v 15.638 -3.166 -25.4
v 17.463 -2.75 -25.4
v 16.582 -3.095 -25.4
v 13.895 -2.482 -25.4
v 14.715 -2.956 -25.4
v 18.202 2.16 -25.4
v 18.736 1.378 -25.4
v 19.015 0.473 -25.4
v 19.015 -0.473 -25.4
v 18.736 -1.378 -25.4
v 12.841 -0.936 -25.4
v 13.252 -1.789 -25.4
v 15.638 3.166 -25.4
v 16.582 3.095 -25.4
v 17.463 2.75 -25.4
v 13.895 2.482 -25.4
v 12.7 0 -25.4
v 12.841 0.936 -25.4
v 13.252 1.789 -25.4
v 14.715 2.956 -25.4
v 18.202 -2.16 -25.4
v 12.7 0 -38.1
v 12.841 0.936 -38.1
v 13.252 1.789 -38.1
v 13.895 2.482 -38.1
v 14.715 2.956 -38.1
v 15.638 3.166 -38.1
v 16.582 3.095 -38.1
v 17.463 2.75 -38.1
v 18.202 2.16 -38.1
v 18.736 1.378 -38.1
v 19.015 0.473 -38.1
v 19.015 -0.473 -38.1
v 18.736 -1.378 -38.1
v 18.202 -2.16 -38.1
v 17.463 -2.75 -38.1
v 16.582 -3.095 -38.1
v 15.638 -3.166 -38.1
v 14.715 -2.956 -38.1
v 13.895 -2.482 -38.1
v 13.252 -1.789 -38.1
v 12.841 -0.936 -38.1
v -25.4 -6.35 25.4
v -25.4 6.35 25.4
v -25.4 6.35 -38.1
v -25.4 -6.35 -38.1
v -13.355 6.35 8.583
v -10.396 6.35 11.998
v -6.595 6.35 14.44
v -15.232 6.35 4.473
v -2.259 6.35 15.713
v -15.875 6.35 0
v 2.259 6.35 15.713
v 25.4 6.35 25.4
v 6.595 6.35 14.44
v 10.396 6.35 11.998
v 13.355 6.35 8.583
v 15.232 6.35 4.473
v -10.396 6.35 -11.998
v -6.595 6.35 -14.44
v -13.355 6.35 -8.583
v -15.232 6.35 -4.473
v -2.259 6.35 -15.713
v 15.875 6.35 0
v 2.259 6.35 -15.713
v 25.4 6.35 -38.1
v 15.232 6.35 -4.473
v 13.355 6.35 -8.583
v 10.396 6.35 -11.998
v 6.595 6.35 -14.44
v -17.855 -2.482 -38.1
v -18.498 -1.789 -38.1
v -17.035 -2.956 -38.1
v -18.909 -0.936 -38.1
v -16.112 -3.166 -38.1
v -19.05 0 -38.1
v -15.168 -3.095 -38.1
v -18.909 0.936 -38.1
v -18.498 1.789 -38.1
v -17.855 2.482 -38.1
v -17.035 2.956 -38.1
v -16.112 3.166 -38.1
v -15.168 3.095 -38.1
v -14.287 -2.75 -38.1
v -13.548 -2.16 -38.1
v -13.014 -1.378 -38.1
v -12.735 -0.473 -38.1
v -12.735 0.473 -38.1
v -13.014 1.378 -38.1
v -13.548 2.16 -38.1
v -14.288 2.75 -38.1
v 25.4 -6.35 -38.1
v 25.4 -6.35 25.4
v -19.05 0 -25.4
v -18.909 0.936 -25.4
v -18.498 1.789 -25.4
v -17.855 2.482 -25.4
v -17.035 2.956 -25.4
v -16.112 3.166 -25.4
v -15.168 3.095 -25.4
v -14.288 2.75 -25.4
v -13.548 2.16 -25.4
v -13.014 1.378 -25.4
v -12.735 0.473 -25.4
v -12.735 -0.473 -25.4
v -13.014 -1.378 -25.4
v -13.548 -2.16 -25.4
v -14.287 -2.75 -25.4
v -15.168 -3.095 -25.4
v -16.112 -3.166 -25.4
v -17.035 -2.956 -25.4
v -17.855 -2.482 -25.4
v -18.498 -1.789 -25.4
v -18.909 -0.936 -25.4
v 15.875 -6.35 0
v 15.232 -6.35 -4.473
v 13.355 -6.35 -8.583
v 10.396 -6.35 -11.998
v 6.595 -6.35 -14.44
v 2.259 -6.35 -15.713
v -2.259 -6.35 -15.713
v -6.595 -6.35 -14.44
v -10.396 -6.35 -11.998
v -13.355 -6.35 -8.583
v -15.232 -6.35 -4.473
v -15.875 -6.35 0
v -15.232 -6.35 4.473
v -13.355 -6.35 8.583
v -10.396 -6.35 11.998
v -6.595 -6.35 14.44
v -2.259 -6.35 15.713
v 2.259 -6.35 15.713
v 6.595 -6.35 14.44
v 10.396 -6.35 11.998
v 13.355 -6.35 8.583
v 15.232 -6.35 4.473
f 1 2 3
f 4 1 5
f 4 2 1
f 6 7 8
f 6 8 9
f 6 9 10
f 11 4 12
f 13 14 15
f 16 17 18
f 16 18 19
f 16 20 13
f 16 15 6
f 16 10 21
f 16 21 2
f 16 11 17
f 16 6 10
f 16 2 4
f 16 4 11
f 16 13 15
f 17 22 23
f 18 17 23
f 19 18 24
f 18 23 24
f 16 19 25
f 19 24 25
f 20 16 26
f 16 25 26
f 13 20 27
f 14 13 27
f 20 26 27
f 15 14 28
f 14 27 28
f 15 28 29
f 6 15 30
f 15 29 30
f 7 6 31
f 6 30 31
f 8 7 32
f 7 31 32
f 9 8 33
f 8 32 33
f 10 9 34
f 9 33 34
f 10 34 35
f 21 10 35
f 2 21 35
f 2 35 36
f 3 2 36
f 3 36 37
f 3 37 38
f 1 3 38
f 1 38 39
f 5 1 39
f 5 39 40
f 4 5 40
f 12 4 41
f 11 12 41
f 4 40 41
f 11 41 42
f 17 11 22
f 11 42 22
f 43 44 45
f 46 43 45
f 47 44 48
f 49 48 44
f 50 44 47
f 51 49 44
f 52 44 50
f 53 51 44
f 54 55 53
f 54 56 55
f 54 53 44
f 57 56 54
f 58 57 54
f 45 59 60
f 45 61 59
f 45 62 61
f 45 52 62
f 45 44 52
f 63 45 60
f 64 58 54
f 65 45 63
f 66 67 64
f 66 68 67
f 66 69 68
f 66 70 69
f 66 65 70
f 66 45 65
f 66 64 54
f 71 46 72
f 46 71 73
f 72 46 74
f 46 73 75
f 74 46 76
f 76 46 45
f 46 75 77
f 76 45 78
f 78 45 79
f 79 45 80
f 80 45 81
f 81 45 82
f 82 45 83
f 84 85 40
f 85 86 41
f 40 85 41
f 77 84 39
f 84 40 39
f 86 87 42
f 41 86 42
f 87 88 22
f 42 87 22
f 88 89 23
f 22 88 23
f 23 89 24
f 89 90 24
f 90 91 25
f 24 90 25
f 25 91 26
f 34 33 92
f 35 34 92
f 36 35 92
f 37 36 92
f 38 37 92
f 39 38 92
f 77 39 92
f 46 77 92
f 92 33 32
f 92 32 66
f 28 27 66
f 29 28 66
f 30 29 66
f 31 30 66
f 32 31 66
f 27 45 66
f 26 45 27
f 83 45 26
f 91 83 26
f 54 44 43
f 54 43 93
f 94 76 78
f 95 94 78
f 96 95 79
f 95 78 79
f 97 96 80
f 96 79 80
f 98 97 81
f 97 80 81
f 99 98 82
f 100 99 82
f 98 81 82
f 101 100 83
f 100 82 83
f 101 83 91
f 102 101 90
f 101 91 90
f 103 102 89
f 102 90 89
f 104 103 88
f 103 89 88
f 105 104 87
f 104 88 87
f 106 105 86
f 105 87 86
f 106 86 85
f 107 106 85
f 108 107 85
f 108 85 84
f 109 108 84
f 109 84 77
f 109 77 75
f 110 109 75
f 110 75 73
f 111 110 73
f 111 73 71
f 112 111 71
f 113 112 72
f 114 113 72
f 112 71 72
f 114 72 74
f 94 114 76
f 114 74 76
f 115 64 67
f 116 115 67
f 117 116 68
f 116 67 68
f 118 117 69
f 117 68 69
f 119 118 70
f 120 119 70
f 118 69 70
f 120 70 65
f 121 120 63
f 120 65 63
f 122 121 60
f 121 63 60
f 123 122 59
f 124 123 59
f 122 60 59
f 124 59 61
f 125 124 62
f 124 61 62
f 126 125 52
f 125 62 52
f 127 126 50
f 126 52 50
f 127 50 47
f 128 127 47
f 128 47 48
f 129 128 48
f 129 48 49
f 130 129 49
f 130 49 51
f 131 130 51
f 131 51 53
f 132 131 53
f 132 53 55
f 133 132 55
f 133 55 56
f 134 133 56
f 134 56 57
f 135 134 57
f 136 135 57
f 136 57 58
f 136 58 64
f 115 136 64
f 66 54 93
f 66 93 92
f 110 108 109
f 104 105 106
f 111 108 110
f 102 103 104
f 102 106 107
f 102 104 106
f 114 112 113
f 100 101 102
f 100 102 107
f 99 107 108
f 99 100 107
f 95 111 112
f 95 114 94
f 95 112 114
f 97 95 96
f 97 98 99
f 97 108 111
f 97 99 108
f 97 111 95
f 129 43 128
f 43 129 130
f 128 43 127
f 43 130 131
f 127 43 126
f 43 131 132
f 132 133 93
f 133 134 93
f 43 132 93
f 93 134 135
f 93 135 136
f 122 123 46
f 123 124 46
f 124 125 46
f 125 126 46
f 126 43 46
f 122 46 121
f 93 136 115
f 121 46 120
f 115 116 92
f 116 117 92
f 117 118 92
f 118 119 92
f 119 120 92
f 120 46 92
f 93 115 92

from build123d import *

# Parameters (mm, degrees)
SKETCH1_W           = 50.8
SKETCH1_H           = 63.5
BOSS_EXTRUDE1_DEPTH = 6.35
SKETCH2_R           = 15.875
CUT_EXTRUDE1_DEPTH  = 13.7
SKETCH3_R           = 3.175
CUT_EXTRUDE2_DEPTH  = 12.7


with BuildPart() as part:
    # Sketch1 → Boss-Extrude1 (new body, symmetric)
    with BuildSketch(Plane(origin=(0, 0, 0), x_dir=(1, 0, 0), z_dir=(0, 1, 0))):
        with Locations((0, 6.35)):
            Rectangle(SKETCH1_W, SKETCH1_H)
    extrude(amount=BOSS_EXTRUDE1_DEPTH, both=True)

    # Sketch2 → Cut-Extrude1 (cut, through all)
    with BuildSketch(Plane(origin=(0, 6.35, 0), x_dir=(1, 0, 0), z_dir=(0, 1, 0))):
        Circle(SKETCH2_R)
    extrude(amount=-CUT_EXTRUDE1_DEPTH, mode=Mode.SUBTRACT)

    # Sketch3 → Cut-Extrude2 (cut)
    with BuildSketch(Plane(origin=(0, 0, -38.1), x_dir=(-1, 0, 0), z_dir=(0, 0, -1))):
        with Locations((-15.875, 0)):
            Circle(SKETCH3_R)
        with Locations((15.875, 0)):
            Circle(SKETCH3_R)
    extrude(amount=-CUT_EXTRUDE2_DEPTH, mode=Mode.SUBTRACT)


solid = part.part
